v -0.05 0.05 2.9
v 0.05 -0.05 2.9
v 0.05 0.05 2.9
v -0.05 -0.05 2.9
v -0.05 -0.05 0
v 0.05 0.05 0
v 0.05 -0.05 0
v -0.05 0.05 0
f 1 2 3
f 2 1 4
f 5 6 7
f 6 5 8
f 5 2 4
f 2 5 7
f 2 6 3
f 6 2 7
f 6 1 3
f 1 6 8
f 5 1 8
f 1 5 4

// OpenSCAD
// Global resolution
$fs = 0.05;  // Don't generate smaller facets than 0.1 mm
$fa = 5;    // Don't generate larger angles than 5 degrees

mainHeight = 2.9;
shoulder = .1;
error=1;
shaftDia = .5125;
cylDia =.75;
keySize = .1;

module Blades(){
    steps = 50;
    tMin = 10;
    tMax = 180;
    tStep = (tMax-tMin)/steps;
    angShft0 = 20;   
    angShft1 = 5;
    angShftStep = (angShft1-angShft0)/steps;
    rMin = cylDia/2;
    rMax = 2.5;
    rStep = (rMax-rMin)/steps;
    
    p1 = [for (i=[0:1:steps]) [(rMin+rStep*i)*cos(i*tStep+tMin),(rMin+rStep*i)*sin(i*tStep+tMin)]];
    p2 = [for (i=[steps:-1:0]) [(rMin+rStep*i)*cos(i*tStep+tMin+angShft0+angShftStep*i),(rMin+rStep*i)*sin(i*tStep+tMin+angShft0+angShftStep*i)]];

    points = concat(p1,p2);
    //echo(points);
    for( i=[0:90:270]){
        rotate([0,0,i]){
            polygon(points); 
        }
    }
}



module Wheel(){
    
    translate([0,0,mainHeight/2])
    union(){
       linear_extrude(height = mainHeight/2-shoulder, scale=.1,twist=45)
       Blades();
       mirror([0,0,1])
       linear_extrude(height = mainHeight/2-shoulder, scale=.1,twist=45)
       Blades(); 
    }
}

module Shaft(){
    
    color("Red")
    union(){
        cylinder(mainHeight+error,shaftDia/2,shaftDia/2);
        translate([shaftDia/2,0,mainHeight/2])
        cube([keySize,keySize,mainHeight],true);
    }
}

module Cyl(){
    color("Green")
    cylinder(mainHeight,cylDia/2,cylDia/2);
}
//temp
translate([0,0,mainHeight/2])
cube([keySize,keySize,mainHeight],true);


/*color("Blue")
difference(){
    union(){
        Wheel();
        Cyl();
    }
    Shaft();
}*/
